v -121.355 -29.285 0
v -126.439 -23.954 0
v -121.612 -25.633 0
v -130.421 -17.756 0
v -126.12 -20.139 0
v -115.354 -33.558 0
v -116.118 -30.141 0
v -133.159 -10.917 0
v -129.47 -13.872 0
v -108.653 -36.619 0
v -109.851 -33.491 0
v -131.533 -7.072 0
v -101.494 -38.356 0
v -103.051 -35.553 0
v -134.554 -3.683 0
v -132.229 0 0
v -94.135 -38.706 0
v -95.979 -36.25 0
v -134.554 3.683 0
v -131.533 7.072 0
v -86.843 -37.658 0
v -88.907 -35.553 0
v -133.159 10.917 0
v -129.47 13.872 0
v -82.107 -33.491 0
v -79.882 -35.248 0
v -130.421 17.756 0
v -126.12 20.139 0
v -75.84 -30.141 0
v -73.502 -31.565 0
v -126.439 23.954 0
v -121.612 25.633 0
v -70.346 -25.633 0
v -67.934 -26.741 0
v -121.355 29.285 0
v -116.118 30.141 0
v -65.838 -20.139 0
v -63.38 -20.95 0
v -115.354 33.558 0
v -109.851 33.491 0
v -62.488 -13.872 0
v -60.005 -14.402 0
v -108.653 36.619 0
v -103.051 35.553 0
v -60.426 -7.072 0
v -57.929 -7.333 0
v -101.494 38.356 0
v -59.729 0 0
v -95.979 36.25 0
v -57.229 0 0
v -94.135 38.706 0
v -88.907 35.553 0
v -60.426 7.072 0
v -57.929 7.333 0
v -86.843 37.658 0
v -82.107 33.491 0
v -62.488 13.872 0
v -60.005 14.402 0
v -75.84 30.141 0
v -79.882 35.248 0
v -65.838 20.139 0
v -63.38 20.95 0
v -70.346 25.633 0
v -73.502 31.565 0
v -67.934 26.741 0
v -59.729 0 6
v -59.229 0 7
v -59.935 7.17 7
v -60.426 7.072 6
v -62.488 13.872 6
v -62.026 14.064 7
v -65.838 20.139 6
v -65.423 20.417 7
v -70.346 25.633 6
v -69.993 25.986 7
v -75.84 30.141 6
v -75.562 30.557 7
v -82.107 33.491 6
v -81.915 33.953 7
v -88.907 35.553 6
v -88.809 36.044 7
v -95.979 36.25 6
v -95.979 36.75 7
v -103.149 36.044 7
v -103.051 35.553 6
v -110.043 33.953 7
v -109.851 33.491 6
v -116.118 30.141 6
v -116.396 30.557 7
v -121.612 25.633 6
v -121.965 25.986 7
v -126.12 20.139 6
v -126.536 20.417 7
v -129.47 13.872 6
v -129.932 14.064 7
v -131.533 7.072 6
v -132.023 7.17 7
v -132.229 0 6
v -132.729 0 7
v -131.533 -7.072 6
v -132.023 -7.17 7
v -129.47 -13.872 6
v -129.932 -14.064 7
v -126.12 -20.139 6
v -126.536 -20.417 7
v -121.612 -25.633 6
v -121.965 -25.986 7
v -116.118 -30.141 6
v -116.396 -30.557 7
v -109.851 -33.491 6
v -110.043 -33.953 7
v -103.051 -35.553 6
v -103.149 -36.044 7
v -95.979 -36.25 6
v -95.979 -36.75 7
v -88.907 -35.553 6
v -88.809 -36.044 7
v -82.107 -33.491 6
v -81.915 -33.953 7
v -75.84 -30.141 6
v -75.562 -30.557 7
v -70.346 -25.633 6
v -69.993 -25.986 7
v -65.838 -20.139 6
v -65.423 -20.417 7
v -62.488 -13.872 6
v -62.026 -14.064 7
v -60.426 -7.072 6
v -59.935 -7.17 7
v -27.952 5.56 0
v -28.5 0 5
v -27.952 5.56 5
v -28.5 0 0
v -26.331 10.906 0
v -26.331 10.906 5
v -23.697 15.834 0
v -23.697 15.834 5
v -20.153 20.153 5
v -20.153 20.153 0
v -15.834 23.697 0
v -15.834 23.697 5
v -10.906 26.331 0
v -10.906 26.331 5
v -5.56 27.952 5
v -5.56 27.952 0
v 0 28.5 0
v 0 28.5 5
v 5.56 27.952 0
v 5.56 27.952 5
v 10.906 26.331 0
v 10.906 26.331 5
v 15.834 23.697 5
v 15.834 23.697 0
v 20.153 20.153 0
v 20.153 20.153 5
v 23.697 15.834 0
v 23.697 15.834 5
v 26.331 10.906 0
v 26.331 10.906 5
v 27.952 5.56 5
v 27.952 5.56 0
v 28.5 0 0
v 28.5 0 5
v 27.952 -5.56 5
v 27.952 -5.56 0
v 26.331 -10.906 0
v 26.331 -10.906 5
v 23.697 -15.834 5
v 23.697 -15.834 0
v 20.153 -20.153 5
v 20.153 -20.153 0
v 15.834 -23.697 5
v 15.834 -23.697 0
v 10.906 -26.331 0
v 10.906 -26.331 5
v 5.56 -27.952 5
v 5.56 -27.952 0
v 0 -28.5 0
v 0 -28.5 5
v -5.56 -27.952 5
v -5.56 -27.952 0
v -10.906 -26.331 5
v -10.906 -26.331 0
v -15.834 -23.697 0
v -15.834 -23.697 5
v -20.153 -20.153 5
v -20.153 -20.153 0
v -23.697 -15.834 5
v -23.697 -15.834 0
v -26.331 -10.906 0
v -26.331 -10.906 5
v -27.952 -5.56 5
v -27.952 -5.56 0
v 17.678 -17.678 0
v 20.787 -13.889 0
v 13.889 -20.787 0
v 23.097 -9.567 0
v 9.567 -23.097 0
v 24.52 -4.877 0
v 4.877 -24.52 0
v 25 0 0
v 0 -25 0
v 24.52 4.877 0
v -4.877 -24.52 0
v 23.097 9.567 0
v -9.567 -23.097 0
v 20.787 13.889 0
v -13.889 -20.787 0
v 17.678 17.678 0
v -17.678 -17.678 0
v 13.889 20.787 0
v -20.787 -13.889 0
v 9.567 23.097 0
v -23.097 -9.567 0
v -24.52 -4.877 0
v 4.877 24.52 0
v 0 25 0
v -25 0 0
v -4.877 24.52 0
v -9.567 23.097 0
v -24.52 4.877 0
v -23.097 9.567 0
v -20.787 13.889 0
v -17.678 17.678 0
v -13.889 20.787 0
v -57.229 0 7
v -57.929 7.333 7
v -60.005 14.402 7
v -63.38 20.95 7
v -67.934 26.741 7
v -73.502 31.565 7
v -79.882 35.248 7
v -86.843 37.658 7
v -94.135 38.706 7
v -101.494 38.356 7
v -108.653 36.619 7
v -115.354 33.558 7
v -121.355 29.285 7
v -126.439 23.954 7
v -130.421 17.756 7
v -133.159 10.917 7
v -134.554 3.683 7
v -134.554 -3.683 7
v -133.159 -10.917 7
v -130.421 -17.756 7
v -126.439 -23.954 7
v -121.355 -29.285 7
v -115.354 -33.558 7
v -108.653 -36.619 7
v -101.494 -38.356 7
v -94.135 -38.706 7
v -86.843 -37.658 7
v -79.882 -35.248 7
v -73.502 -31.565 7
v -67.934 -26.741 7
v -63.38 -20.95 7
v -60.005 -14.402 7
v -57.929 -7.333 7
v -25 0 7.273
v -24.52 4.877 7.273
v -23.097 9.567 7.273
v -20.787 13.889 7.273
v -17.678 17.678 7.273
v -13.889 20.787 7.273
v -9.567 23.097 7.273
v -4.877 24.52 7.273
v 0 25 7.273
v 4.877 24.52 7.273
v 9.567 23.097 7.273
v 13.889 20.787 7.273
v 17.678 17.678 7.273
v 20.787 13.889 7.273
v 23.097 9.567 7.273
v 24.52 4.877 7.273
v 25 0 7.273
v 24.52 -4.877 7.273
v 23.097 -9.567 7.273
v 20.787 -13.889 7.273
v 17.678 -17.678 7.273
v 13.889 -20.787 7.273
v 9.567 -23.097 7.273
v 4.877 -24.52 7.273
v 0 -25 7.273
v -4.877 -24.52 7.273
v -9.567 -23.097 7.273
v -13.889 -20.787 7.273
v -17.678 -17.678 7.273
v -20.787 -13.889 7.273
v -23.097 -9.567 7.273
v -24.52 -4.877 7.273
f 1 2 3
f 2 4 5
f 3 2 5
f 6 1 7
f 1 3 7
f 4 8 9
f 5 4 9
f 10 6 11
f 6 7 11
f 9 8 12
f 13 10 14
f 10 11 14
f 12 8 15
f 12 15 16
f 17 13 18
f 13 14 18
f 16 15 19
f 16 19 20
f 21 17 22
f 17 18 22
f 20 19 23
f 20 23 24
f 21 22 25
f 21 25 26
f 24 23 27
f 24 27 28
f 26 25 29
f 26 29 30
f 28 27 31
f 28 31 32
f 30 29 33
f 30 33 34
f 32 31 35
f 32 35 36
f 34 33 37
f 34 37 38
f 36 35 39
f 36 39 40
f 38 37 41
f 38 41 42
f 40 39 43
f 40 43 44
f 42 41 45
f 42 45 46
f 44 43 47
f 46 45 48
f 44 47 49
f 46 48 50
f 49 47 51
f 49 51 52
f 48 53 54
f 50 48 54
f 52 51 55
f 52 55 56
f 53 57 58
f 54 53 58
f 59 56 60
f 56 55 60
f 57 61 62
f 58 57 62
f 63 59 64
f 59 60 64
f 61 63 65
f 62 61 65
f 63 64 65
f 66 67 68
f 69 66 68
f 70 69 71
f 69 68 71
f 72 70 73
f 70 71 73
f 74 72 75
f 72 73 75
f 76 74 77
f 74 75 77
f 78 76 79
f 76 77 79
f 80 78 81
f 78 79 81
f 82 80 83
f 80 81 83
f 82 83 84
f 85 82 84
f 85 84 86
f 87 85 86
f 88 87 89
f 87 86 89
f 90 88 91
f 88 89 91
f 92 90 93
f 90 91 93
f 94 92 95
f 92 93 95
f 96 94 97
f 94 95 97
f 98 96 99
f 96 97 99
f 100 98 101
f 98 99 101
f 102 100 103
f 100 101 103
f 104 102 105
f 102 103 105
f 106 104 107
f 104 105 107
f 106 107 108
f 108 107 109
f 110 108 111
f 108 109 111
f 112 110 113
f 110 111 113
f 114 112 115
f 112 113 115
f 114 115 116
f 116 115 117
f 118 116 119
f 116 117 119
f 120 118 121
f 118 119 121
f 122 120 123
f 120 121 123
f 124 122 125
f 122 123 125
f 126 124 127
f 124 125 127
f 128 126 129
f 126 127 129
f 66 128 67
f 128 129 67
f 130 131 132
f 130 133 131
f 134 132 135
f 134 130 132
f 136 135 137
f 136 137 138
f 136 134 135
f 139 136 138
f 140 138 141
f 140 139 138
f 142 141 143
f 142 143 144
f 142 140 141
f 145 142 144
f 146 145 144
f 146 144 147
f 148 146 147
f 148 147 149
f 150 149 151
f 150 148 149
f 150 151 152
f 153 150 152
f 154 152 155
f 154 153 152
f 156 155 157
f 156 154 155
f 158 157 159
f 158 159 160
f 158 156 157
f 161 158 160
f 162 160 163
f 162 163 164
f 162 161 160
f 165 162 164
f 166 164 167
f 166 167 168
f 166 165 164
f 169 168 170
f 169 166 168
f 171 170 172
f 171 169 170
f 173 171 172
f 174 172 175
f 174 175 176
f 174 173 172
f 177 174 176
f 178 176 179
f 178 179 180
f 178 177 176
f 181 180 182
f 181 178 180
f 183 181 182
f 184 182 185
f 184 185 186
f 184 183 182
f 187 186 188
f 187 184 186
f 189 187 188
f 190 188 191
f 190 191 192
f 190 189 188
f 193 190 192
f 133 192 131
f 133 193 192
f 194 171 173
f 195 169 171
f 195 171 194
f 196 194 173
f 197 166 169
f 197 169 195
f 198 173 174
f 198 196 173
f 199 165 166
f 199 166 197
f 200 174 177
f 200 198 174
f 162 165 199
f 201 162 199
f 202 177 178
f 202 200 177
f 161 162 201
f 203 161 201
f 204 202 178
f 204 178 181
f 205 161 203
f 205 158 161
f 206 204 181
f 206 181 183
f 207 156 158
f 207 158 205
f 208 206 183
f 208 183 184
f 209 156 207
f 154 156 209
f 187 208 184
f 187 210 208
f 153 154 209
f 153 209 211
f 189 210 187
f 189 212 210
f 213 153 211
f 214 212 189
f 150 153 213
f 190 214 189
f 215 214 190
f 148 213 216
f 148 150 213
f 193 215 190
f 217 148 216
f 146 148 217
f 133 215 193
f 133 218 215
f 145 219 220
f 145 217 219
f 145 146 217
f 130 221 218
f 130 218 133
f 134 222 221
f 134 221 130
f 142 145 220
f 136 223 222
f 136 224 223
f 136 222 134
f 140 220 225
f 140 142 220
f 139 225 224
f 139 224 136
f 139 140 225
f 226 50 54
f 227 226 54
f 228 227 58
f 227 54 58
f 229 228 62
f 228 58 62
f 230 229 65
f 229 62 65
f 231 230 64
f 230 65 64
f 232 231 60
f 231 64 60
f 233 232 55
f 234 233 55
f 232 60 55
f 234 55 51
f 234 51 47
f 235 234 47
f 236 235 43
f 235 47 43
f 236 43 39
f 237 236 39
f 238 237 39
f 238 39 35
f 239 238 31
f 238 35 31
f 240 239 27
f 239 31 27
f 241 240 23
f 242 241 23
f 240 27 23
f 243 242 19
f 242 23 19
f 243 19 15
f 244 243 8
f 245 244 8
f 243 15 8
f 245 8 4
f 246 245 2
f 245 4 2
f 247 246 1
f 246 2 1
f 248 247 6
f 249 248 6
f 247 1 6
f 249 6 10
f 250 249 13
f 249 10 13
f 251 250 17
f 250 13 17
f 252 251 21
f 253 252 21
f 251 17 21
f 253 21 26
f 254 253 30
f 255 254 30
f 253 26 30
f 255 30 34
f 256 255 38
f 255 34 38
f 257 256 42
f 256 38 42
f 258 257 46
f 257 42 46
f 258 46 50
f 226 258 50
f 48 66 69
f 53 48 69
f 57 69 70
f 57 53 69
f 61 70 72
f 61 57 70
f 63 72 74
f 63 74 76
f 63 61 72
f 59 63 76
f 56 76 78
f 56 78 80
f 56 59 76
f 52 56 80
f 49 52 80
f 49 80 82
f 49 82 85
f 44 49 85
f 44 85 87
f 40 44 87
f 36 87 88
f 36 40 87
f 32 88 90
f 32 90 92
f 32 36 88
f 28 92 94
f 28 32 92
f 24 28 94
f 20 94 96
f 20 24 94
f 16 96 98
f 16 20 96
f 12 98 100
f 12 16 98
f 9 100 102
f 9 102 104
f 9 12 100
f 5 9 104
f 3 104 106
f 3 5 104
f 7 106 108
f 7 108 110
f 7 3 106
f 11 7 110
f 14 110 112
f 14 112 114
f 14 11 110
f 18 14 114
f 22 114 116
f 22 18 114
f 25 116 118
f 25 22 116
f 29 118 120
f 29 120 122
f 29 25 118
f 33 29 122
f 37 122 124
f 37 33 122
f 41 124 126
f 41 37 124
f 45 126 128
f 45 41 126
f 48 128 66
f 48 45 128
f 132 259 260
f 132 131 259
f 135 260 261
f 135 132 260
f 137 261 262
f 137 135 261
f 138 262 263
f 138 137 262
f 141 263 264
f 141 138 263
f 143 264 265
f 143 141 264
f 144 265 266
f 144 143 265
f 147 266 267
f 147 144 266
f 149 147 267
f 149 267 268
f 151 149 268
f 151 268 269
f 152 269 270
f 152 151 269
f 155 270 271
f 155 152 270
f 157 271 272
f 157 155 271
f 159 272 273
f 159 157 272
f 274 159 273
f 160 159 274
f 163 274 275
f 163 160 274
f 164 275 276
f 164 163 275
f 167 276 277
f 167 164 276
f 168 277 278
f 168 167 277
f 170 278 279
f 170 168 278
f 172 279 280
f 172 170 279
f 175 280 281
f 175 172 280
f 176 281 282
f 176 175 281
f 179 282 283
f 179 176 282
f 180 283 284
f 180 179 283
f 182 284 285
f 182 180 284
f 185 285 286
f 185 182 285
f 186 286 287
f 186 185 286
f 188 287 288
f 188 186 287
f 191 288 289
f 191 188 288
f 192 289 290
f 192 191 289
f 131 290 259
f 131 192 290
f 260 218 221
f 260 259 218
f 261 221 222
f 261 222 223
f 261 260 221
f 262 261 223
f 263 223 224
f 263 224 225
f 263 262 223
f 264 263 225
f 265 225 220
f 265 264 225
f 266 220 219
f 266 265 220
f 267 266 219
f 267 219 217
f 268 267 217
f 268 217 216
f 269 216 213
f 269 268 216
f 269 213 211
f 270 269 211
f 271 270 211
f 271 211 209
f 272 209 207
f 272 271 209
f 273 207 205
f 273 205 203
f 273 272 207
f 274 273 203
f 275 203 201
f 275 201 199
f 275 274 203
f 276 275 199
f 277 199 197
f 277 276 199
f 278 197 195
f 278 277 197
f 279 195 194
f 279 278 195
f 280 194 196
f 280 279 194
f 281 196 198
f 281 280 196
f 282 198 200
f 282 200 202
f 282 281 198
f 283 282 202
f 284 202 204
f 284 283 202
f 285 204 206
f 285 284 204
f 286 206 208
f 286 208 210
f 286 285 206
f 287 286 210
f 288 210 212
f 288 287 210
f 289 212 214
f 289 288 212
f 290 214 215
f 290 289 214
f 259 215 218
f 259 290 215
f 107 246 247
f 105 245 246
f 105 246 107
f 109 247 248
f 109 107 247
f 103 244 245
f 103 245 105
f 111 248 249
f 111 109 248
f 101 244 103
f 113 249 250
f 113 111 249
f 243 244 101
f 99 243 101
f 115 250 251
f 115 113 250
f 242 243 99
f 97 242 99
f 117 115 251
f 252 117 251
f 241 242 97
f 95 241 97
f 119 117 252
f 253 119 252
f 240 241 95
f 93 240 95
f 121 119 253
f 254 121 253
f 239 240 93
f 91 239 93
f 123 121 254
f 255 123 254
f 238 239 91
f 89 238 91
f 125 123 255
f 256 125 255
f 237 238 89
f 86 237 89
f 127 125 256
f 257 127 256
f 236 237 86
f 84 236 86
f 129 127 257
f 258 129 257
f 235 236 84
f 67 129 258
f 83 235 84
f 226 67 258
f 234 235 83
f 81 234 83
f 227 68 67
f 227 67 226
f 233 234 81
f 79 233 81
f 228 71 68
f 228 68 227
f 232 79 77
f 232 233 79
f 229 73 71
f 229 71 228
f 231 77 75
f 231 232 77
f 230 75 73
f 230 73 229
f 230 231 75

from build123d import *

# Parameters (mm, degrees)
F2_R     = 38.75
F2_R_2   = 36.25
F3_DEPTH = 7
F4_SIZE2 = 0.5
F4_SIZE  = 1


with BuildPart() as f1:
    # F0 (on Front) → F1 (revolve)
    with BuildSketch(Plane.XZ):
        Polygon((-28.5, 0), (-25, 0), (-25, 7.272927), (-28.5, 5), align=None)
    revolve(axis=Axis((0, 0, -16.917149), (0, 0, -1)))


with BuildPart() as f3:
    # F2 (on Top) → F3 (new body)
    with BuildSketch(Plane.XY):
        with Locations((-95.979044, 0)):
            Circle(F2_R)
        with Locations((-95.979044, 0)):
            Circle(F2_R_2, mode=Mode.SUBTRACT)
    extrude(amount=F3_DEPTH)

    # F4
    f4_edges = [f3.edges().sort_by_distance(p)[0] for p in [
        (-132.229044, 0, 7),
    ]]
    chamfer(f4_edges, length=F4_SIZE, length2=F4_SIZE2)


solid = Compound([f1.part, f3.part])
